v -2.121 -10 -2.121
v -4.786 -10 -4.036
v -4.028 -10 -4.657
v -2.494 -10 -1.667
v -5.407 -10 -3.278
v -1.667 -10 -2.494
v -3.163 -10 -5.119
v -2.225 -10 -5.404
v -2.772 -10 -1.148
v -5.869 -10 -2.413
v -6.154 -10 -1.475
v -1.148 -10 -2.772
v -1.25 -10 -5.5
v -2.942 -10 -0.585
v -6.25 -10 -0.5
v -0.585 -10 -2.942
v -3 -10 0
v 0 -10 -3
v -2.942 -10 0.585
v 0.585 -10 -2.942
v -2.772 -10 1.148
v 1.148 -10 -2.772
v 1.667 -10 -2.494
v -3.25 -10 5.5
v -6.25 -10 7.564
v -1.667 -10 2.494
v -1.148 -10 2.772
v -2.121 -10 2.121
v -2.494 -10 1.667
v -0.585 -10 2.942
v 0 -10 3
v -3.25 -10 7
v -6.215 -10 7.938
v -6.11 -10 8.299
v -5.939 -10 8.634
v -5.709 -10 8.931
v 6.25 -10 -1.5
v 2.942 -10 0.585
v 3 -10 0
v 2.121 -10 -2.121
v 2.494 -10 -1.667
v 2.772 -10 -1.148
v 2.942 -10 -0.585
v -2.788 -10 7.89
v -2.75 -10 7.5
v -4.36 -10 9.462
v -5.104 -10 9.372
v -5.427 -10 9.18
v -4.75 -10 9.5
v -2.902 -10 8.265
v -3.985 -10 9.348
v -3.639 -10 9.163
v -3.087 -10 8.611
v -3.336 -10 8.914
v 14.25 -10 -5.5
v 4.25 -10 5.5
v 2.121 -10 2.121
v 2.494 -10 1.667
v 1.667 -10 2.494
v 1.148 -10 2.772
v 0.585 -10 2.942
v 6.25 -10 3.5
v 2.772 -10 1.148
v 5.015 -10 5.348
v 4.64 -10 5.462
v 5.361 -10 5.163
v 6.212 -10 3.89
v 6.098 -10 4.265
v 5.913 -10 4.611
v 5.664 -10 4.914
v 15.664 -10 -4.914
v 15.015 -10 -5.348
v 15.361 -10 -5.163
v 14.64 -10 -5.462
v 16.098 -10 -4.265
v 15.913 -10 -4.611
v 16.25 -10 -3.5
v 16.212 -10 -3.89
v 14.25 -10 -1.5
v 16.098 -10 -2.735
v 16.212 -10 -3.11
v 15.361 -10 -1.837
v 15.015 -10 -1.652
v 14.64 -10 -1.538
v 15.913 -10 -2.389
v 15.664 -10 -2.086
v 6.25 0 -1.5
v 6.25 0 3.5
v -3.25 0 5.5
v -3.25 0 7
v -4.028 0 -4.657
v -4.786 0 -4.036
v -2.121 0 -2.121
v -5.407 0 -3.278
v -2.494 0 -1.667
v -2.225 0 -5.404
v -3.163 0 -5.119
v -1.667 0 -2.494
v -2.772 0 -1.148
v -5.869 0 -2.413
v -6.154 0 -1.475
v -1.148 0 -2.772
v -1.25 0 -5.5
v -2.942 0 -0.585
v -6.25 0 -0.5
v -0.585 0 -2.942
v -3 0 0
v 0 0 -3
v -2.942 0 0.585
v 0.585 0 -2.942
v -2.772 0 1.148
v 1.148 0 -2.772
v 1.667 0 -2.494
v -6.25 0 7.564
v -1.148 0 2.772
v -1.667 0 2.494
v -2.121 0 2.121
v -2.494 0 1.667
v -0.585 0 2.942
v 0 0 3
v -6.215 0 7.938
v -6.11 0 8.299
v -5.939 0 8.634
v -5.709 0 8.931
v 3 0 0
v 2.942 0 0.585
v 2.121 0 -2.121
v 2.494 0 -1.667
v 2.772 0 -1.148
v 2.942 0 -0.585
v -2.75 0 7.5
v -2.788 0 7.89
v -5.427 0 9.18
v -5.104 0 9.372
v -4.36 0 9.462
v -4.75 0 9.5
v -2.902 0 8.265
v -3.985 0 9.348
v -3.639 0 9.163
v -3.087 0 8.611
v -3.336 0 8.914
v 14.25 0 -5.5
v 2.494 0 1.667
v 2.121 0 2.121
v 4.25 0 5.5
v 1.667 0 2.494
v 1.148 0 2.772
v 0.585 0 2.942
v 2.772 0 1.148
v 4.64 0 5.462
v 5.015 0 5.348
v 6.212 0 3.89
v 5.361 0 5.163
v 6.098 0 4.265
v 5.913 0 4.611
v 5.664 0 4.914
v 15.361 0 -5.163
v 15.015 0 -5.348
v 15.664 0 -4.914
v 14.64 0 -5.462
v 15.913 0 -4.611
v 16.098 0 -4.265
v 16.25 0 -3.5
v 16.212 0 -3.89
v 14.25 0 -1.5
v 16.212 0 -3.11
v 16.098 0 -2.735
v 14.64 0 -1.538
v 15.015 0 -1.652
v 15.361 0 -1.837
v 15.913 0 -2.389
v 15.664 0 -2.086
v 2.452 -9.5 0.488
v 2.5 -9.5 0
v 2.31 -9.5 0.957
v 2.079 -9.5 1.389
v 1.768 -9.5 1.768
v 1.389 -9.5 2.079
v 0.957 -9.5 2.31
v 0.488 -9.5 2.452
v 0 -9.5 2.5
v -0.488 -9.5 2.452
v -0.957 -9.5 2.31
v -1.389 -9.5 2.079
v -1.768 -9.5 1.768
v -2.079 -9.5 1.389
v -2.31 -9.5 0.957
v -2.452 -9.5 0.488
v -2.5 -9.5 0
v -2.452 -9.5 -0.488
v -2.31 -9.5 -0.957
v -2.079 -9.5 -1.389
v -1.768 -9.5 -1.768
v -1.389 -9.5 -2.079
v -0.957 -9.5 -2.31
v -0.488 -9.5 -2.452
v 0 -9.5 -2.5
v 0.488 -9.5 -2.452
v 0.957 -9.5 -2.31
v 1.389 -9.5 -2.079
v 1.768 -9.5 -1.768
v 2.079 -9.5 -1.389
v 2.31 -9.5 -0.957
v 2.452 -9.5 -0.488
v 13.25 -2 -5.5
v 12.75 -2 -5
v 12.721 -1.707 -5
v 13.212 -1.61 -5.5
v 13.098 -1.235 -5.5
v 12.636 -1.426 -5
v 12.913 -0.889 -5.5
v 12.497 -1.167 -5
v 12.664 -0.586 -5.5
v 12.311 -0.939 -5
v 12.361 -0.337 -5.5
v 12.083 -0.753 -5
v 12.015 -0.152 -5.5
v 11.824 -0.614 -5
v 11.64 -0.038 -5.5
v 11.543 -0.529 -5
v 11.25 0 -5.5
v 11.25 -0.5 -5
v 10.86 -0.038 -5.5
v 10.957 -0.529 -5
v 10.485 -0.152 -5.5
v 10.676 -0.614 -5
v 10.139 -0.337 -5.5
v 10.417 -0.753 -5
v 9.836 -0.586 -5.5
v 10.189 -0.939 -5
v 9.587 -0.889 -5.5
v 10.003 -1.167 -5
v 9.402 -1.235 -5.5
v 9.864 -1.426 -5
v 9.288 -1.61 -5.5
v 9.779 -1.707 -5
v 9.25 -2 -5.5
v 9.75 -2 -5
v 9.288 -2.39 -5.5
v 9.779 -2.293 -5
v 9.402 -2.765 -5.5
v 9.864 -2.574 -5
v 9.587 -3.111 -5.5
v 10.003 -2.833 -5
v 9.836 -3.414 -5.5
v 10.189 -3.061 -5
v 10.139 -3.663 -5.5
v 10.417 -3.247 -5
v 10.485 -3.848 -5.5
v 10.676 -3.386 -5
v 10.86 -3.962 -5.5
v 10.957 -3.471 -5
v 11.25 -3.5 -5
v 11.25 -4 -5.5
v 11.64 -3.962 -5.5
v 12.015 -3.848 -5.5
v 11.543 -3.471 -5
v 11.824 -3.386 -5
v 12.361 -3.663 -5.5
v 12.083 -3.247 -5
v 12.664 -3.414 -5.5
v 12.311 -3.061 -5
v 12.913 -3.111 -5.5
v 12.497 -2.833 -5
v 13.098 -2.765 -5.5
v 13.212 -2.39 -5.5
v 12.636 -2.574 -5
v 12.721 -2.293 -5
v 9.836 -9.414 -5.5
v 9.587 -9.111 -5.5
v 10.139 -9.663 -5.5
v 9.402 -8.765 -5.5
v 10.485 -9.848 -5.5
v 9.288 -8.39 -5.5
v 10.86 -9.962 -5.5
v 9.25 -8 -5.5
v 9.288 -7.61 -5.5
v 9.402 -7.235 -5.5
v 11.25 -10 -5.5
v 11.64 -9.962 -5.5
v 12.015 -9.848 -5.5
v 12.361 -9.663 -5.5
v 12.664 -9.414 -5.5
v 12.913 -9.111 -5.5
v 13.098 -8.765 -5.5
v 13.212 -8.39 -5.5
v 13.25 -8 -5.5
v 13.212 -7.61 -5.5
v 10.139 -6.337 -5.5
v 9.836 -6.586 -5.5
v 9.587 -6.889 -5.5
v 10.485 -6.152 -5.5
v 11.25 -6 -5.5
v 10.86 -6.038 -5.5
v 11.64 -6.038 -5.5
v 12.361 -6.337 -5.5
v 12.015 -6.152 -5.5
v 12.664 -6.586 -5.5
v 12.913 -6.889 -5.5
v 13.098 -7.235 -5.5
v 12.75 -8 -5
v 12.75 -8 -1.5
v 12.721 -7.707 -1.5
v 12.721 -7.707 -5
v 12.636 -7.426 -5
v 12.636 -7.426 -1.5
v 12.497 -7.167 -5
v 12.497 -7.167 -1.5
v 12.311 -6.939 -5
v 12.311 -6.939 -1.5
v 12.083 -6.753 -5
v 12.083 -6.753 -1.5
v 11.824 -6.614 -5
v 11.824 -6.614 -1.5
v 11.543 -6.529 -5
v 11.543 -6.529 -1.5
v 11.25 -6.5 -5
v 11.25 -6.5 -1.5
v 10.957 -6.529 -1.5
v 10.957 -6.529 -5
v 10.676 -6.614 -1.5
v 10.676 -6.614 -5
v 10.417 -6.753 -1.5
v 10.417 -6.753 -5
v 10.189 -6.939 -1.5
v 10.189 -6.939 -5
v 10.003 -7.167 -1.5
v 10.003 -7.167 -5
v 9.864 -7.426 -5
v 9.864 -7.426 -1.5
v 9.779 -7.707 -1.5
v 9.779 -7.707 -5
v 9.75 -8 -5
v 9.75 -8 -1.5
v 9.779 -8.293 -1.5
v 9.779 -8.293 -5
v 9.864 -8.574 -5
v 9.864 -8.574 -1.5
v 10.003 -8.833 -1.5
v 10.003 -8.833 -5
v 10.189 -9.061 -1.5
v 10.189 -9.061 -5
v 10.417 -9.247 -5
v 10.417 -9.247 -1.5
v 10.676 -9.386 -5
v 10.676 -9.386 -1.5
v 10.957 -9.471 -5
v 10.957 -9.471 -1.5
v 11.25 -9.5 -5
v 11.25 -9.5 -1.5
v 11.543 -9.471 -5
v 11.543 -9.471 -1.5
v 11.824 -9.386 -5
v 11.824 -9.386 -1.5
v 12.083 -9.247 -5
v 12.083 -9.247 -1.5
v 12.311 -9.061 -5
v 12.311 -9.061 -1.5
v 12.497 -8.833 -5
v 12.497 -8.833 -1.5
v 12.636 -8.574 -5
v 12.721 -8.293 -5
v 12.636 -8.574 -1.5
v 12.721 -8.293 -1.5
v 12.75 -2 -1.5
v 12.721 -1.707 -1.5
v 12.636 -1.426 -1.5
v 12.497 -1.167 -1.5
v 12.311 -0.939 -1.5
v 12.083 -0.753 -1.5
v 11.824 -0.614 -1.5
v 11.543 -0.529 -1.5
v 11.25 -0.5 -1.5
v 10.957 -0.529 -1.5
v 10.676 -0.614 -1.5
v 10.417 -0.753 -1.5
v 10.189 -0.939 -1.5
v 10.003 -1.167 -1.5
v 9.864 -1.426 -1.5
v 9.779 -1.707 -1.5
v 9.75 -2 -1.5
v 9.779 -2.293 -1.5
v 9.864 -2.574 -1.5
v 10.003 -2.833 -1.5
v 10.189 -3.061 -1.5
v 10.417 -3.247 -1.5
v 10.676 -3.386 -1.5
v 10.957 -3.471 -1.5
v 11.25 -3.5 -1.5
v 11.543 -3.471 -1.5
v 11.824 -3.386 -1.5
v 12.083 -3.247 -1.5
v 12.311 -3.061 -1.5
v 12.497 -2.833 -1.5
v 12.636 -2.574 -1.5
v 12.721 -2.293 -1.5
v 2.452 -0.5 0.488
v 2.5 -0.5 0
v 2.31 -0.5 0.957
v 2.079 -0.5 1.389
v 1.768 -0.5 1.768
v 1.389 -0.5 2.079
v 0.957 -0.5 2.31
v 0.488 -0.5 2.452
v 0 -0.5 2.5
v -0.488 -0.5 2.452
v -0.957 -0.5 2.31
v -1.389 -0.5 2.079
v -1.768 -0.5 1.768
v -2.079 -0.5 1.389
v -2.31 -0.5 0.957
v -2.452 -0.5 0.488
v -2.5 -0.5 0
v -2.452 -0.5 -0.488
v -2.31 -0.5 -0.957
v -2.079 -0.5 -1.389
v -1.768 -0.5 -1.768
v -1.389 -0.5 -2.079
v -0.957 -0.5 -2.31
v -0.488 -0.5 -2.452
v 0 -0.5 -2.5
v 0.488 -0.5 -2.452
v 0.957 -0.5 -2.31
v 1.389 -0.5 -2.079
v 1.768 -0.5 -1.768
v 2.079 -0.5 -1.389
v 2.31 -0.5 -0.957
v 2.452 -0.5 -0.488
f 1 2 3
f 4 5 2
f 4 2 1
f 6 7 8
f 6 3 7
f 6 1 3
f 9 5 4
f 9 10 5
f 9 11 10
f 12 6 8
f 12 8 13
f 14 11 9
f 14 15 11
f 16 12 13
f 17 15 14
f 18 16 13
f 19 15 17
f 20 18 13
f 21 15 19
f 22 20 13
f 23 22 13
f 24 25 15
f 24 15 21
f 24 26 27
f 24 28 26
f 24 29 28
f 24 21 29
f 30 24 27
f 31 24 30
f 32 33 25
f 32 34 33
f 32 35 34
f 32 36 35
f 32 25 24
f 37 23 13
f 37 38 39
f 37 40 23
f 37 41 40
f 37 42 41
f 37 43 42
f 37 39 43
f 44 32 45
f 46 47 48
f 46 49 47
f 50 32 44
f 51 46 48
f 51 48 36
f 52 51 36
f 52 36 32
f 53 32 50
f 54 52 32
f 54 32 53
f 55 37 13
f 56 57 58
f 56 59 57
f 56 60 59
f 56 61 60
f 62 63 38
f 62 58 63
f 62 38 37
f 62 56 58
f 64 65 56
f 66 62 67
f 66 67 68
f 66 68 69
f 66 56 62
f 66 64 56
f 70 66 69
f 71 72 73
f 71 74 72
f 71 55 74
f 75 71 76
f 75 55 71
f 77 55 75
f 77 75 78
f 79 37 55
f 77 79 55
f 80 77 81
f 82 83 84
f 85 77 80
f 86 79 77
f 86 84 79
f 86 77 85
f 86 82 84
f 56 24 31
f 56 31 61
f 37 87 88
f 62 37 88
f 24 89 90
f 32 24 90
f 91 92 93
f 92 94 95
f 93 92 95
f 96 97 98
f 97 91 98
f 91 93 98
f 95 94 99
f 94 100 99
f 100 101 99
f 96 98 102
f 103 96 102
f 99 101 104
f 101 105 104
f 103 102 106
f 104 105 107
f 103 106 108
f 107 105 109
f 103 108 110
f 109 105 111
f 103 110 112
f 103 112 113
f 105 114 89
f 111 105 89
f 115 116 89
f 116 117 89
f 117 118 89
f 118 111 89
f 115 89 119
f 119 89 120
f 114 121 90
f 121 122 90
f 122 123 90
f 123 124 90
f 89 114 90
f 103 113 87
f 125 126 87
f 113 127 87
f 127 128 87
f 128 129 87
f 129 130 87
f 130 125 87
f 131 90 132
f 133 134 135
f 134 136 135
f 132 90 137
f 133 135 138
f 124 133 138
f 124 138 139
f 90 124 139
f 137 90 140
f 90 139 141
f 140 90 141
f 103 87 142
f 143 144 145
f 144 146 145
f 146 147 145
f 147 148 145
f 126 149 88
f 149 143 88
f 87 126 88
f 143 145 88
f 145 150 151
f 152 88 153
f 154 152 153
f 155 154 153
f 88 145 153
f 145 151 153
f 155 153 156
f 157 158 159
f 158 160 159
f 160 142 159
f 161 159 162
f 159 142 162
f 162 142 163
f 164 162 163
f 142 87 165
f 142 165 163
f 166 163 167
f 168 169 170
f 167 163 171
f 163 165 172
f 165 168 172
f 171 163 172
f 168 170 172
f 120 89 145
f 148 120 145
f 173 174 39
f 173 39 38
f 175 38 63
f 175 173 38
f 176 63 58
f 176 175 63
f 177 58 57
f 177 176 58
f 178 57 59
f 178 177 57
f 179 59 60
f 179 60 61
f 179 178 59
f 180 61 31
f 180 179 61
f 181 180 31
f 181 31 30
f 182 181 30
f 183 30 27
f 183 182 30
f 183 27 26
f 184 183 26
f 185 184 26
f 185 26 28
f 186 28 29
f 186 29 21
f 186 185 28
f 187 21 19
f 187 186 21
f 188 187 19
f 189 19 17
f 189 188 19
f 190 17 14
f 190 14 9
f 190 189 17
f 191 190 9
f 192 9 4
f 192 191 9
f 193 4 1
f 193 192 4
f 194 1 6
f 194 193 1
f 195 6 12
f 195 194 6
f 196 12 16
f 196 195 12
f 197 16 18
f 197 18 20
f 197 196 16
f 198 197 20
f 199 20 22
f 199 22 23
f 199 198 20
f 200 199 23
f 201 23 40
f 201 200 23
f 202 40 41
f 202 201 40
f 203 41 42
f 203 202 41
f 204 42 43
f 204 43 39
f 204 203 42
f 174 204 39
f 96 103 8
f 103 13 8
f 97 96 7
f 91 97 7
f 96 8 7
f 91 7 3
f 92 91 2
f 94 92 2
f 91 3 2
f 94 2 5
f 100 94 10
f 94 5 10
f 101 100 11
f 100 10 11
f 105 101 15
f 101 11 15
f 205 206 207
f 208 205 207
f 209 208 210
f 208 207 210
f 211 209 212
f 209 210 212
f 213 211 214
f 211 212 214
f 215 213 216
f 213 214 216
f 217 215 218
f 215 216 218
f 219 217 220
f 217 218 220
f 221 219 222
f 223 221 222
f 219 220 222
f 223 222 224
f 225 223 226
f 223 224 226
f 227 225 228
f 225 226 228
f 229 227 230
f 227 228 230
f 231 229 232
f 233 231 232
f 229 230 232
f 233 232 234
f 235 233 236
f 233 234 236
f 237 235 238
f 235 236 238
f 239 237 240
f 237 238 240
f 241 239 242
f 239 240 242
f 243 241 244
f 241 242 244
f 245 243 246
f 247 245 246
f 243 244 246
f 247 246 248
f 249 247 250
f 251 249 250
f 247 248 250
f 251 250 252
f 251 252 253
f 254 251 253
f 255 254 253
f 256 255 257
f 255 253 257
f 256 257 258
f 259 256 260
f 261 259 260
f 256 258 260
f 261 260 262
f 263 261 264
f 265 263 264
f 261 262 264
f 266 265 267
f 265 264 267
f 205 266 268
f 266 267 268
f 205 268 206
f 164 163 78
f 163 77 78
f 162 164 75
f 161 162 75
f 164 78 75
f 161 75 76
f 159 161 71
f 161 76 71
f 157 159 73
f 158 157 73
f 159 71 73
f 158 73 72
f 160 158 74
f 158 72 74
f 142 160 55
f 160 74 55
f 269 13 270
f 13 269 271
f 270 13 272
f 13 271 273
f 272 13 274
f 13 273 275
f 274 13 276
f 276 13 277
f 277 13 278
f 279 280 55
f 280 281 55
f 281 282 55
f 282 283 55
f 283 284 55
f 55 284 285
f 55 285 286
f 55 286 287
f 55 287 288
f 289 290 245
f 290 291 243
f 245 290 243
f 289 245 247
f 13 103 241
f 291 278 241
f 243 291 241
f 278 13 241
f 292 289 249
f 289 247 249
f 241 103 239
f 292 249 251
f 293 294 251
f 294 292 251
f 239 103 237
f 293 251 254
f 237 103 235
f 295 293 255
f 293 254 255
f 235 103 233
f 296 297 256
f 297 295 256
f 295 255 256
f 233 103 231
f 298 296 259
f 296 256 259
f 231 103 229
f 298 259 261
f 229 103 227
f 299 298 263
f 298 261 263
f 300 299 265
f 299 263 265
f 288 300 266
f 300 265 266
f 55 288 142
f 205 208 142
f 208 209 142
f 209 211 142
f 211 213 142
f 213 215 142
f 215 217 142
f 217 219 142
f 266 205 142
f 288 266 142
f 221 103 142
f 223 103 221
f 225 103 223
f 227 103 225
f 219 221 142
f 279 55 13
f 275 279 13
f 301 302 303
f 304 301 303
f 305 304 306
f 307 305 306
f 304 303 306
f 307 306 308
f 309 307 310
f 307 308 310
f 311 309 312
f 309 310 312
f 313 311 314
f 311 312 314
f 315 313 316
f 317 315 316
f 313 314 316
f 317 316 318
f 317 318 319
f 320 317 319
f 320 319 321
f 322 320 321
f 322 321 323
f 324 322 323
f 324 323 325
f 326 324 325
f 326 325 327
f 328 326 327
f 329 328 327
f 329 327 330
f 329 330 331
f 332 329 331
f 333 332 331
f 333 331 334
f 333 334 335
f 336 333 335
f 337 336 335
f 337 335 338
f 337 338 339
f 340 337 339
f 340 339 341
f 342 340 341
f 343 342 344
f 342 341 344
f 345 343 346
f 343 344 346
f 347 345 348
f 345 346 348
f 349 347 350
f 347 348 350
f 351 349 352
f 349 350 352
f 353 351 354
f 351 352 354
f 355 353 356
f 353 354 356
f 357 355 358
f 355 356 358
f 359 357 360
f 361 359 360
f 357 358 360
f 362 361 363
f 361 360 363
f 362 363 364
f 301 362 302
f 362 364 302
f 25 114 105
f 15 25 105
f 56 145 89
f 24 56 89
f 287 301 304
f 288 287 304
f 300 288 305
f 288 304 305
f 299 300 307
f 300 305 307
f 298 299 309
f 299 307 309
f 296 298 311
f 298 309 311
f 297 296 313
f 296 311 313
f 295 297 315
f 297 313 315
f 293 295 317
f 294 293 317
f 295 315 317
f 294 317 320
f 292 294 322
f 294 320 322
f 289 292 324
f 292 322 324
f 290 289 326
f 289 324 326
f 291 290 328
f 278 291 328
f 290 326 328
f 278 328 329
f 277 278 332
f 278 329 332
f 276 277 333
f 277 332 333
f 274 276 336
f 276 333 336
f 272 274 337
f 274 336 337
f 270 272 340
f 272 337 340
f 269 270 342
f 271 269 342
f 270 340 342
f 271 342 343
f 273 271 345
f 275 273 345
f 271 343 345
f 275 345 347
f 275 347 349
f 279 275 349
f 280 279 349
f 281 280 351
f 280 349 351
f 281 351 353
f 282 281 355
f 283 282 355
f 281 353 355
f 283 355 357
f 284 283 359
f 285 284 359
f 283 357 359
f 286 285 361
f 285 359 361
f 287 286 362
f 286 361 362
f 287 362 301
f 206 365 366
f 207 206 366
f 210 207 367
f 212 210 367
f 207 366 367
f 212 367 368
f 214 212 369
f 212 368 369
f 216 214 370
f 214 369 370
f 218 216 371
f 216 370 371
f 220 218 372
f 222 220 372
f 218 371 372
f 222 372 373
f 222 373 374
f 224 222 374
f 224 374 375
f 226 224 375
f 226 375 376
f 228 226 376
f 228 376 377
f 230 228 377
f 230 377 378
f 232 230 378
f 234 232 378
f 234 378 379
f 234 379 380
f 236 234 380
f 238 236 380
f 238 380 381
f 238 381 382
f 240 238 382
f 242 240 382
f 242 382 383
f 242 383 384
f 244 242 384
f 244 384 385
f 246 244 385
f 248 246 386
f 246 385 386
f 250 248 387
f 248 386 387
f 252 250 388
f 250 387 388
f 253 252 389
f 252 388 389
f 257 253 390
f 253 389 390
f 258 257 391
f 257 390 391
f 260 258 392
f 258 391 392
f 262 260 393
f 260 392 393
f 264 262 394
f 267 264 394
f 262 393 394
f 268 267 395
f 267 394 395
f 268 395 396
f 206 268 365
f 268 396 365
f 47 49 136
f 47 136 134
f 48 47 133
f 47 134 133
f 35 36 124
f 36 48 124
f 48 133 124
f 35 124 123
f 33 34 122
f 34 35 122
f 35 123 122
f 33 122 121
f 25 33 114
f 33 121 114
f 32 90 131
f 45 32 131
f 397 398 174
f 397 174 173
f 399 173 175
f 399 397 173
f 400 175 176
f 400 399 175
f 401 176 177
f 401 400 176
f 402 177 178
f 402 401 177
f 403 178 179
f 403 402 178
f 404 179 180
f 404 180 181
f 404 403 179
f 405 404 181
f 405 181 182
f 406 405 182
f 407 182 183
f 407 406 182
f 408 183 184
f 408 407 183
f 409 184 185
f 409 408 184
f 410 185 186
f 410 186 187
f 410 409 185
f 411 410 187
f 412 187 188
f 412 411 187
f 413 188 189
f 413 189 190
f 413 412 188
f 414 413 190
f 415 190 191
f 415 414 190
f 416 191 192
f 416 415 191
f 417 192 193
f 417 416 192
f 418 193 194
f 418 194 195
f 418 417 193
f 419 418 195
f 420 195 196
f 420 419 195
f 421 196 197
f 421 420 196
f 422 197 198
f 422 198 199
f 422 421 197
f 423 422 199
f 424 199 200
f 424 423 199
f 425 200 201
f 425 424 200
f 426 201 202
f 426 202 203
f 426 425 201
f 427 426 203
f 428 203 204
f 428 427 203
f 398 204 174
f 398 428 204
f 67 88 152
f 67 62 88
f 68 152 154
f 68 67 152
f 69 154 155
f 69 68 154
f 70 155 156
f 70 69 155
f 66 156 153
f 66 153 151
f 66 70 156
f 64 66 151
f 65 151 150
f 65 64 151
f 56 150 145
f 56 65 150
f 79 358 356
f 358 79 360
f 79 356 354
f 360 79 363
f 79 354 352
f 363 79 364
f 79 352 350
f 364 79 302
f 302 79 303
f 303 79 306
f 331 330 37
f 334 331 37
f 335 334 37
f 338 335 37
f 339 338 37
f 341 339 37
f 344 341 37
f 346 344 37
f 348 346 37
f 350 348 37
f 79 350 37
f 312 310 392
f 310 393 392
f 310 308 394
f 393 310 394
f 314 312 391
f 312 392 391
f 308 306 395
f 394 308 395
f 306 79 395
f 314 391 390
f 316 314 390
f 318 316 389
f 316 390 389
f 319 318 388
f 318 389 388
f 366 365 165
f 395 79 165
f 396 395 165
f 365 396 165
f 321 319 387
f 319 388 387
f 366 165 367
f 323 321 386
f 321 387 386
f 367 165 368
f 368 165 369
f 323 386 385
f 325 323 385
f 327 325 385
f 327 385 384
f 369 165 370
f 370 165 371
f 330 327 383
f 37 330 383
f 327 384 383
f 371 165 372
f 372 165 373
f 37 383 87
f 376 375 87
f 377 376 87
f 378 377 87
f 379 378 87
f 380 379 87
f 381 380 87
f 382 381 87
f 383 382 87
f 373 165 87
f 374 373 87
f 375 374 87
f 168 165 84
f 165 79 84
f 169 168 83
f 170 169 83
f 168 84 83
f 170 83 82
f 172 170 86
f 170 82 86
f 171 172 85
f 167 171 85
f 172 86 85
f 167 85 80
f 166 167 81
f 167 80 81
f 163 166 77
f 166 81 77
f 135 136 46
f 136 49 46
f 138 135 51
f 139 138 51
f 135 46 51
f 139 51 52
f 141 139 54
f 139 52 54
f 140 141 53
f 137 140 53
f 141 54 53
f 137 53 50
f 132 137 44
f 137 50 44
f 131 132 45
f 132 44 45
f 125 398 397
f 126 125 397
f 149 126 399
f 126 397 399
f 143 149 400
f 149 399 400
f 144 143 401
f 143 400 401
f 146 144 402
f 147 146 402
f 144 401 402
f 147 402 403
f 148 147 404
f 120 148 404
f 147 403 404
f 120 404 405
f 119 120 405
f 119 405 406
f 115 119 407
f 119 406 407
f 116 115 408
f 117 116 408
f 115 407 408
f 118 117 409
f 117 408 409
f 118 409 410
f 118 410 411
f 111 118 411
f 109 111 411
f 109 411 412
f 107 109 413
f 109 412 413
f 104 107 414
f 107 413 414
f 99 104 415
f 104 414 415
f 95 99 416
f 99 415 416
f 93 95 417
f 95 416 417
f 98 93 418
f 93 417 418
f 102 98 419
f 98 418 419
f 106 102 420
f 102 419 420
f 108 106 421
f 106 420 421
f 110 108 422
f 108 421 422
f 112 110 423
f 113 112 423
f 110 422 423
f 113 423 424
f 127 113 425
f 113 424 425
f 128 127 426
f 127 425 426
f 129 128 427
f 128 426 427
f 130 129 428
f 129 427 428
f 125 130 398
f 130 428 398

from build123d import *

# Parameters (mm, degrees)
F0_R        = 2.5
F1_DEPTH    = 10
F2_R        = 1.5
F3_DEPTH    = 25
F4_R        = 1.99999
F5_T1_DEPTH = 19.6824712753
F6_R        = 5
F7_R        = 2
F8_R        = 1.99999
F9_SIZE     = 0.49999
F10_SIZE    = 0.5


# Not quite as in the source:
# - a fillet or chamfer that OpenCascade refuses, or shapes differently, is made with other operations: its cross-section is extruded or revolved along the edge and cut away or added
# - a fillet or chamfer is up to 0.001 mm smaller than in the source, because OpenCascade refuses the exact size


with BuildPart() as f1:
    # F0 (on Front) → F1 (new body)
    with BuildSketch(Plane.XZ):
        Polygon((-2.75, 9.5), (-6.25, 9.5), (-6.25, -5.5), (16.25, -5.5), (16.25, -1.5), (6.25, -1.5), (6.25, 5.5), (-3.25, 5.5), (-3.25, 7), (-2.75, 7.5), align=None)
        Circle(F0_R, mode=Mode.SUBTRACT)
    extrude(amount=F1_DEPTH)

    # F2 (on face) → F3 (cut)
    with BuildSketch(Plane.XY.offset(-1.5)):
        with Locations((11.25, -8)):
            Circle(F2_R)
        with Locations((11.25, -2)):
            Circle(F2_R)
    extrude(amount=-F3_DEPTH, mode=Mode.SUBTRACT)

    # F4 (radius 2 in the source; OpenCascade refuses exactly that, so slightly less here)
    f4_edges = [f1.edges().sort_by_distance(p)[0] for p in [
        (-2.75, -5, 9.5),
    ]]
    fillet(f4_edges, radius=F4_R)

    # F5: fillet of radius 2 on 1 edges, made by hand

    # F5_s2 → F5_t1 (cut)
    with BuildSketch(Plane.XZ.offset(-4.8412356377)):
        with BuildLine():
            ThreePointArc((-4.74999, 9.5), (-5.8311356678, 8.7882546988), (-6.25, 7.5635057449))
            Line((-6.25, 7.5635057449), (-6.25, 9.5))
            Line((-6.25, 9.5), (-4.74999, 9.5))
        make_face()
    extrude(amount=F5_T1_DEPTH, mode=Mode.SUBTRACT)

    # F6
    f6_edges = [f1.edges().sort_by_distance(p)[0] for p in [
        (-6.25, -5, -5.5),
    ]]
    fillet(f6_edges, radius=F6_R)

    # F7
    f7_edges = [f1.edges().sort_by_distance(p)[0] for p in [
        (6.25, -5, 5.5),
    ]]
    fillet(f7_edges, radius=F7_R)

    # F8 (radius 2 in the source; OpenCascade refuses exactly that, so slightly less here)
    f8_edges = [f1.edges().sort_by_distance(p)[0] for p in [
        (16.25, -5, -1.5),
        (16.25, -5, -5.5),
    ]]
    fillet(f8_edges, radius=F8_R)

    # F9 (size 0.5 in the source; OpenCascade refuses exactly that, so slightly less here)
    f9_edges = [f1.edges().sort_by_distance(p)[0] for p in [
        (9.75, -8, -5.5),
        (9.75, -2, -5.5),
    ]]
    chamfer(f9_edges, length=F9_SIZE)

    # F10
    f10_edges = [f1.edges().sort_by_distance(p)[0] for p in [
        (-2.5, -10, 0),
        (-2.5, 0, 0),
    ]]
    chamfer(f10_edges, length=F10_SIZE)


solid = f1.part
